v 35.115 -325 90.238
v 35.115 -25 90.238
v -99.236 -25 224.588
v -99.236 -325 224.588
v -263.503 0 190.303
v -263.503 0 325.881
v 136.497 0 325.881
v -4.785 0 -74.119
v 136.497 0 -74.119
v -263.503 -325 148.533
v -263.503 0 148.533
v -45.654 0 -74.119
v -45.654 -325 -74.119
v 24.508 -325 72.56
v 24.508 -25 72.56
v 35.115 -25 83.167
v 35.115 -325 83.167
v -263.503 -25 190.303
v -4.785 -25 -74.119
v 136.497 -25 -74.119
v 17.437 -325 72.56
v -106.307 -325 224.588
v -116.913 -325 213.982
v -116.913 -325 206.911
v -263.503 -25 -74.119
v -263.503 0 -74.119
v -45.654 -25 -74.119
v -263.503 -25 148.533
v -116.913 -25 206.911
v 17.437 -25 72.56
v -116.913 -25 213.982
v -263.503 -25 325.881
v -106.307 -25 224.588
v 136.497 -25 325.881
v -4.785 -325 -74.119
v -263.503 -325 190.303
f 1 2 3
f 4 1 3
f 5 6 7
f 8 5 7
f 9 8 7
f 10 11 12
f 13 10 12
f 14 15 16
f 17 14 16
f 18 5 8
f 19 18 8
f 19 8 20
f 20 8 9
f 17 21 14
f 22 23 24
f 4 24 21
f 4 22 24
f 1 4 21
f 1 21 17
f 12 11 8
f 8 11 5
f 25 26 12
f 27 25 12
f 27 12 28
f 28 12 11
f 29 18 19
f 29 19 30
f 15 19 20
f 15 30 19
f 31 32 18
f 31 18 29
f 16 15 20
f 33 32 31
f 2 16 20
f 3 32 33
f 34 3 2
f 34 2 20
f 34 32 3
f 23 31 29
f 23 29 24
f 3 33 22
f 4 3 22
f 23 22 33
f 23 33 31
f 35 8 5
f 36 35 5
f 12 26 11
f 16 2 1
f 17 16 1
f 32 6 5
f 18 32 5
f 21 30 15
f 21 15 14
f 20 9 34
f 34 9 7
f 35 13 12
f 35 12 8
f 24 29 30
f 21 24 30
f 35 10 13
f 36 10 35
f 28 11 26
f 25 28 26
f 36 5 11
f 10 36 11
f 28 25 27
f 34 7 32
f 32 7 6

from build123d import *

# Parameters (mm, degrees)
F1_DEPTH = 25
F2_DEPTH = 325
F3_DEPTH = 325
F4_SIZE  = 5


with BuildPart() as f1:
    # F0 (on Front) → F1 (new body)
    with BuildSketch(Plane.XZ):
        Polygon((136.4967631549, 325.8810894129), (-263.5032368451, 325.8810894129), (-263.5032368451, 190.3028462152), (-4.7845391905, -74.1189105871), (136.4967631549, -74.1189105871), (136.4967631549, -51.7552420497), align=None)
        Polygon((-102.7711352796, 228.1239825229), (38.6502209577, 86.7026262856), (20.972551428, 69.0249567559), (-120.4488048093, 210.4463129933), align=None, mode=Mode.SUBTRACT)
    extrude(amount=F1_DEPTH)

    # F0 (on Front) → F3 (join)
    with BuildSketch(Plane.XZ):
        Polygon((20.972551428, 69.0249567559), (38.6502209577, 86.7026262856), (-102.7711352796, 228.1239825229), (-120.4488048093, 210.4463129933), align=None)
    extrude(amount=F3_DEPTH)

    # F4
    f4_edges = [f1.edges().sort_by_distance(p)[0] for p in [
        (38.650221, -175, 86.702626),
        (20.972551, -175, 69.024957),
        (-102.771135, -175, 228.123983),
        (-120.448805, -175, 210.446313),
    ]]
    chamfer(f4_edges, length=F4_SIZE)


with BuildPart() as f1b:
    # F0 (on Front) → F1, piece 2 (new body)
    with BuildSketch(Plane.XZ):
        Polygon((-152.1320251086, 34.7065203477), (-263.5032368451, 148.5327406076), (-263.5032368451, -74.1189105871), (-45.6537454706, -74.1189105871), align=None)
    extrude(amount=F1_DEPTH)


with BuildPart() as f2:
    # F0 (on Front) → F2 (new body)
    with BuildSketch(Plane.XZ):
        Polygon((-4.7845391905, -74.1189105871), (-263.5032368451, 190.3028462152), (-263.5032368451, 148.5327406076), (-152.1320251086, 34.7065203477), (-45.6537454706, -74.1189105871), align=None)
    extrude(amount=F2_DEPTH)


solid = Compound([f1.part, f1b.part, f2.part])
